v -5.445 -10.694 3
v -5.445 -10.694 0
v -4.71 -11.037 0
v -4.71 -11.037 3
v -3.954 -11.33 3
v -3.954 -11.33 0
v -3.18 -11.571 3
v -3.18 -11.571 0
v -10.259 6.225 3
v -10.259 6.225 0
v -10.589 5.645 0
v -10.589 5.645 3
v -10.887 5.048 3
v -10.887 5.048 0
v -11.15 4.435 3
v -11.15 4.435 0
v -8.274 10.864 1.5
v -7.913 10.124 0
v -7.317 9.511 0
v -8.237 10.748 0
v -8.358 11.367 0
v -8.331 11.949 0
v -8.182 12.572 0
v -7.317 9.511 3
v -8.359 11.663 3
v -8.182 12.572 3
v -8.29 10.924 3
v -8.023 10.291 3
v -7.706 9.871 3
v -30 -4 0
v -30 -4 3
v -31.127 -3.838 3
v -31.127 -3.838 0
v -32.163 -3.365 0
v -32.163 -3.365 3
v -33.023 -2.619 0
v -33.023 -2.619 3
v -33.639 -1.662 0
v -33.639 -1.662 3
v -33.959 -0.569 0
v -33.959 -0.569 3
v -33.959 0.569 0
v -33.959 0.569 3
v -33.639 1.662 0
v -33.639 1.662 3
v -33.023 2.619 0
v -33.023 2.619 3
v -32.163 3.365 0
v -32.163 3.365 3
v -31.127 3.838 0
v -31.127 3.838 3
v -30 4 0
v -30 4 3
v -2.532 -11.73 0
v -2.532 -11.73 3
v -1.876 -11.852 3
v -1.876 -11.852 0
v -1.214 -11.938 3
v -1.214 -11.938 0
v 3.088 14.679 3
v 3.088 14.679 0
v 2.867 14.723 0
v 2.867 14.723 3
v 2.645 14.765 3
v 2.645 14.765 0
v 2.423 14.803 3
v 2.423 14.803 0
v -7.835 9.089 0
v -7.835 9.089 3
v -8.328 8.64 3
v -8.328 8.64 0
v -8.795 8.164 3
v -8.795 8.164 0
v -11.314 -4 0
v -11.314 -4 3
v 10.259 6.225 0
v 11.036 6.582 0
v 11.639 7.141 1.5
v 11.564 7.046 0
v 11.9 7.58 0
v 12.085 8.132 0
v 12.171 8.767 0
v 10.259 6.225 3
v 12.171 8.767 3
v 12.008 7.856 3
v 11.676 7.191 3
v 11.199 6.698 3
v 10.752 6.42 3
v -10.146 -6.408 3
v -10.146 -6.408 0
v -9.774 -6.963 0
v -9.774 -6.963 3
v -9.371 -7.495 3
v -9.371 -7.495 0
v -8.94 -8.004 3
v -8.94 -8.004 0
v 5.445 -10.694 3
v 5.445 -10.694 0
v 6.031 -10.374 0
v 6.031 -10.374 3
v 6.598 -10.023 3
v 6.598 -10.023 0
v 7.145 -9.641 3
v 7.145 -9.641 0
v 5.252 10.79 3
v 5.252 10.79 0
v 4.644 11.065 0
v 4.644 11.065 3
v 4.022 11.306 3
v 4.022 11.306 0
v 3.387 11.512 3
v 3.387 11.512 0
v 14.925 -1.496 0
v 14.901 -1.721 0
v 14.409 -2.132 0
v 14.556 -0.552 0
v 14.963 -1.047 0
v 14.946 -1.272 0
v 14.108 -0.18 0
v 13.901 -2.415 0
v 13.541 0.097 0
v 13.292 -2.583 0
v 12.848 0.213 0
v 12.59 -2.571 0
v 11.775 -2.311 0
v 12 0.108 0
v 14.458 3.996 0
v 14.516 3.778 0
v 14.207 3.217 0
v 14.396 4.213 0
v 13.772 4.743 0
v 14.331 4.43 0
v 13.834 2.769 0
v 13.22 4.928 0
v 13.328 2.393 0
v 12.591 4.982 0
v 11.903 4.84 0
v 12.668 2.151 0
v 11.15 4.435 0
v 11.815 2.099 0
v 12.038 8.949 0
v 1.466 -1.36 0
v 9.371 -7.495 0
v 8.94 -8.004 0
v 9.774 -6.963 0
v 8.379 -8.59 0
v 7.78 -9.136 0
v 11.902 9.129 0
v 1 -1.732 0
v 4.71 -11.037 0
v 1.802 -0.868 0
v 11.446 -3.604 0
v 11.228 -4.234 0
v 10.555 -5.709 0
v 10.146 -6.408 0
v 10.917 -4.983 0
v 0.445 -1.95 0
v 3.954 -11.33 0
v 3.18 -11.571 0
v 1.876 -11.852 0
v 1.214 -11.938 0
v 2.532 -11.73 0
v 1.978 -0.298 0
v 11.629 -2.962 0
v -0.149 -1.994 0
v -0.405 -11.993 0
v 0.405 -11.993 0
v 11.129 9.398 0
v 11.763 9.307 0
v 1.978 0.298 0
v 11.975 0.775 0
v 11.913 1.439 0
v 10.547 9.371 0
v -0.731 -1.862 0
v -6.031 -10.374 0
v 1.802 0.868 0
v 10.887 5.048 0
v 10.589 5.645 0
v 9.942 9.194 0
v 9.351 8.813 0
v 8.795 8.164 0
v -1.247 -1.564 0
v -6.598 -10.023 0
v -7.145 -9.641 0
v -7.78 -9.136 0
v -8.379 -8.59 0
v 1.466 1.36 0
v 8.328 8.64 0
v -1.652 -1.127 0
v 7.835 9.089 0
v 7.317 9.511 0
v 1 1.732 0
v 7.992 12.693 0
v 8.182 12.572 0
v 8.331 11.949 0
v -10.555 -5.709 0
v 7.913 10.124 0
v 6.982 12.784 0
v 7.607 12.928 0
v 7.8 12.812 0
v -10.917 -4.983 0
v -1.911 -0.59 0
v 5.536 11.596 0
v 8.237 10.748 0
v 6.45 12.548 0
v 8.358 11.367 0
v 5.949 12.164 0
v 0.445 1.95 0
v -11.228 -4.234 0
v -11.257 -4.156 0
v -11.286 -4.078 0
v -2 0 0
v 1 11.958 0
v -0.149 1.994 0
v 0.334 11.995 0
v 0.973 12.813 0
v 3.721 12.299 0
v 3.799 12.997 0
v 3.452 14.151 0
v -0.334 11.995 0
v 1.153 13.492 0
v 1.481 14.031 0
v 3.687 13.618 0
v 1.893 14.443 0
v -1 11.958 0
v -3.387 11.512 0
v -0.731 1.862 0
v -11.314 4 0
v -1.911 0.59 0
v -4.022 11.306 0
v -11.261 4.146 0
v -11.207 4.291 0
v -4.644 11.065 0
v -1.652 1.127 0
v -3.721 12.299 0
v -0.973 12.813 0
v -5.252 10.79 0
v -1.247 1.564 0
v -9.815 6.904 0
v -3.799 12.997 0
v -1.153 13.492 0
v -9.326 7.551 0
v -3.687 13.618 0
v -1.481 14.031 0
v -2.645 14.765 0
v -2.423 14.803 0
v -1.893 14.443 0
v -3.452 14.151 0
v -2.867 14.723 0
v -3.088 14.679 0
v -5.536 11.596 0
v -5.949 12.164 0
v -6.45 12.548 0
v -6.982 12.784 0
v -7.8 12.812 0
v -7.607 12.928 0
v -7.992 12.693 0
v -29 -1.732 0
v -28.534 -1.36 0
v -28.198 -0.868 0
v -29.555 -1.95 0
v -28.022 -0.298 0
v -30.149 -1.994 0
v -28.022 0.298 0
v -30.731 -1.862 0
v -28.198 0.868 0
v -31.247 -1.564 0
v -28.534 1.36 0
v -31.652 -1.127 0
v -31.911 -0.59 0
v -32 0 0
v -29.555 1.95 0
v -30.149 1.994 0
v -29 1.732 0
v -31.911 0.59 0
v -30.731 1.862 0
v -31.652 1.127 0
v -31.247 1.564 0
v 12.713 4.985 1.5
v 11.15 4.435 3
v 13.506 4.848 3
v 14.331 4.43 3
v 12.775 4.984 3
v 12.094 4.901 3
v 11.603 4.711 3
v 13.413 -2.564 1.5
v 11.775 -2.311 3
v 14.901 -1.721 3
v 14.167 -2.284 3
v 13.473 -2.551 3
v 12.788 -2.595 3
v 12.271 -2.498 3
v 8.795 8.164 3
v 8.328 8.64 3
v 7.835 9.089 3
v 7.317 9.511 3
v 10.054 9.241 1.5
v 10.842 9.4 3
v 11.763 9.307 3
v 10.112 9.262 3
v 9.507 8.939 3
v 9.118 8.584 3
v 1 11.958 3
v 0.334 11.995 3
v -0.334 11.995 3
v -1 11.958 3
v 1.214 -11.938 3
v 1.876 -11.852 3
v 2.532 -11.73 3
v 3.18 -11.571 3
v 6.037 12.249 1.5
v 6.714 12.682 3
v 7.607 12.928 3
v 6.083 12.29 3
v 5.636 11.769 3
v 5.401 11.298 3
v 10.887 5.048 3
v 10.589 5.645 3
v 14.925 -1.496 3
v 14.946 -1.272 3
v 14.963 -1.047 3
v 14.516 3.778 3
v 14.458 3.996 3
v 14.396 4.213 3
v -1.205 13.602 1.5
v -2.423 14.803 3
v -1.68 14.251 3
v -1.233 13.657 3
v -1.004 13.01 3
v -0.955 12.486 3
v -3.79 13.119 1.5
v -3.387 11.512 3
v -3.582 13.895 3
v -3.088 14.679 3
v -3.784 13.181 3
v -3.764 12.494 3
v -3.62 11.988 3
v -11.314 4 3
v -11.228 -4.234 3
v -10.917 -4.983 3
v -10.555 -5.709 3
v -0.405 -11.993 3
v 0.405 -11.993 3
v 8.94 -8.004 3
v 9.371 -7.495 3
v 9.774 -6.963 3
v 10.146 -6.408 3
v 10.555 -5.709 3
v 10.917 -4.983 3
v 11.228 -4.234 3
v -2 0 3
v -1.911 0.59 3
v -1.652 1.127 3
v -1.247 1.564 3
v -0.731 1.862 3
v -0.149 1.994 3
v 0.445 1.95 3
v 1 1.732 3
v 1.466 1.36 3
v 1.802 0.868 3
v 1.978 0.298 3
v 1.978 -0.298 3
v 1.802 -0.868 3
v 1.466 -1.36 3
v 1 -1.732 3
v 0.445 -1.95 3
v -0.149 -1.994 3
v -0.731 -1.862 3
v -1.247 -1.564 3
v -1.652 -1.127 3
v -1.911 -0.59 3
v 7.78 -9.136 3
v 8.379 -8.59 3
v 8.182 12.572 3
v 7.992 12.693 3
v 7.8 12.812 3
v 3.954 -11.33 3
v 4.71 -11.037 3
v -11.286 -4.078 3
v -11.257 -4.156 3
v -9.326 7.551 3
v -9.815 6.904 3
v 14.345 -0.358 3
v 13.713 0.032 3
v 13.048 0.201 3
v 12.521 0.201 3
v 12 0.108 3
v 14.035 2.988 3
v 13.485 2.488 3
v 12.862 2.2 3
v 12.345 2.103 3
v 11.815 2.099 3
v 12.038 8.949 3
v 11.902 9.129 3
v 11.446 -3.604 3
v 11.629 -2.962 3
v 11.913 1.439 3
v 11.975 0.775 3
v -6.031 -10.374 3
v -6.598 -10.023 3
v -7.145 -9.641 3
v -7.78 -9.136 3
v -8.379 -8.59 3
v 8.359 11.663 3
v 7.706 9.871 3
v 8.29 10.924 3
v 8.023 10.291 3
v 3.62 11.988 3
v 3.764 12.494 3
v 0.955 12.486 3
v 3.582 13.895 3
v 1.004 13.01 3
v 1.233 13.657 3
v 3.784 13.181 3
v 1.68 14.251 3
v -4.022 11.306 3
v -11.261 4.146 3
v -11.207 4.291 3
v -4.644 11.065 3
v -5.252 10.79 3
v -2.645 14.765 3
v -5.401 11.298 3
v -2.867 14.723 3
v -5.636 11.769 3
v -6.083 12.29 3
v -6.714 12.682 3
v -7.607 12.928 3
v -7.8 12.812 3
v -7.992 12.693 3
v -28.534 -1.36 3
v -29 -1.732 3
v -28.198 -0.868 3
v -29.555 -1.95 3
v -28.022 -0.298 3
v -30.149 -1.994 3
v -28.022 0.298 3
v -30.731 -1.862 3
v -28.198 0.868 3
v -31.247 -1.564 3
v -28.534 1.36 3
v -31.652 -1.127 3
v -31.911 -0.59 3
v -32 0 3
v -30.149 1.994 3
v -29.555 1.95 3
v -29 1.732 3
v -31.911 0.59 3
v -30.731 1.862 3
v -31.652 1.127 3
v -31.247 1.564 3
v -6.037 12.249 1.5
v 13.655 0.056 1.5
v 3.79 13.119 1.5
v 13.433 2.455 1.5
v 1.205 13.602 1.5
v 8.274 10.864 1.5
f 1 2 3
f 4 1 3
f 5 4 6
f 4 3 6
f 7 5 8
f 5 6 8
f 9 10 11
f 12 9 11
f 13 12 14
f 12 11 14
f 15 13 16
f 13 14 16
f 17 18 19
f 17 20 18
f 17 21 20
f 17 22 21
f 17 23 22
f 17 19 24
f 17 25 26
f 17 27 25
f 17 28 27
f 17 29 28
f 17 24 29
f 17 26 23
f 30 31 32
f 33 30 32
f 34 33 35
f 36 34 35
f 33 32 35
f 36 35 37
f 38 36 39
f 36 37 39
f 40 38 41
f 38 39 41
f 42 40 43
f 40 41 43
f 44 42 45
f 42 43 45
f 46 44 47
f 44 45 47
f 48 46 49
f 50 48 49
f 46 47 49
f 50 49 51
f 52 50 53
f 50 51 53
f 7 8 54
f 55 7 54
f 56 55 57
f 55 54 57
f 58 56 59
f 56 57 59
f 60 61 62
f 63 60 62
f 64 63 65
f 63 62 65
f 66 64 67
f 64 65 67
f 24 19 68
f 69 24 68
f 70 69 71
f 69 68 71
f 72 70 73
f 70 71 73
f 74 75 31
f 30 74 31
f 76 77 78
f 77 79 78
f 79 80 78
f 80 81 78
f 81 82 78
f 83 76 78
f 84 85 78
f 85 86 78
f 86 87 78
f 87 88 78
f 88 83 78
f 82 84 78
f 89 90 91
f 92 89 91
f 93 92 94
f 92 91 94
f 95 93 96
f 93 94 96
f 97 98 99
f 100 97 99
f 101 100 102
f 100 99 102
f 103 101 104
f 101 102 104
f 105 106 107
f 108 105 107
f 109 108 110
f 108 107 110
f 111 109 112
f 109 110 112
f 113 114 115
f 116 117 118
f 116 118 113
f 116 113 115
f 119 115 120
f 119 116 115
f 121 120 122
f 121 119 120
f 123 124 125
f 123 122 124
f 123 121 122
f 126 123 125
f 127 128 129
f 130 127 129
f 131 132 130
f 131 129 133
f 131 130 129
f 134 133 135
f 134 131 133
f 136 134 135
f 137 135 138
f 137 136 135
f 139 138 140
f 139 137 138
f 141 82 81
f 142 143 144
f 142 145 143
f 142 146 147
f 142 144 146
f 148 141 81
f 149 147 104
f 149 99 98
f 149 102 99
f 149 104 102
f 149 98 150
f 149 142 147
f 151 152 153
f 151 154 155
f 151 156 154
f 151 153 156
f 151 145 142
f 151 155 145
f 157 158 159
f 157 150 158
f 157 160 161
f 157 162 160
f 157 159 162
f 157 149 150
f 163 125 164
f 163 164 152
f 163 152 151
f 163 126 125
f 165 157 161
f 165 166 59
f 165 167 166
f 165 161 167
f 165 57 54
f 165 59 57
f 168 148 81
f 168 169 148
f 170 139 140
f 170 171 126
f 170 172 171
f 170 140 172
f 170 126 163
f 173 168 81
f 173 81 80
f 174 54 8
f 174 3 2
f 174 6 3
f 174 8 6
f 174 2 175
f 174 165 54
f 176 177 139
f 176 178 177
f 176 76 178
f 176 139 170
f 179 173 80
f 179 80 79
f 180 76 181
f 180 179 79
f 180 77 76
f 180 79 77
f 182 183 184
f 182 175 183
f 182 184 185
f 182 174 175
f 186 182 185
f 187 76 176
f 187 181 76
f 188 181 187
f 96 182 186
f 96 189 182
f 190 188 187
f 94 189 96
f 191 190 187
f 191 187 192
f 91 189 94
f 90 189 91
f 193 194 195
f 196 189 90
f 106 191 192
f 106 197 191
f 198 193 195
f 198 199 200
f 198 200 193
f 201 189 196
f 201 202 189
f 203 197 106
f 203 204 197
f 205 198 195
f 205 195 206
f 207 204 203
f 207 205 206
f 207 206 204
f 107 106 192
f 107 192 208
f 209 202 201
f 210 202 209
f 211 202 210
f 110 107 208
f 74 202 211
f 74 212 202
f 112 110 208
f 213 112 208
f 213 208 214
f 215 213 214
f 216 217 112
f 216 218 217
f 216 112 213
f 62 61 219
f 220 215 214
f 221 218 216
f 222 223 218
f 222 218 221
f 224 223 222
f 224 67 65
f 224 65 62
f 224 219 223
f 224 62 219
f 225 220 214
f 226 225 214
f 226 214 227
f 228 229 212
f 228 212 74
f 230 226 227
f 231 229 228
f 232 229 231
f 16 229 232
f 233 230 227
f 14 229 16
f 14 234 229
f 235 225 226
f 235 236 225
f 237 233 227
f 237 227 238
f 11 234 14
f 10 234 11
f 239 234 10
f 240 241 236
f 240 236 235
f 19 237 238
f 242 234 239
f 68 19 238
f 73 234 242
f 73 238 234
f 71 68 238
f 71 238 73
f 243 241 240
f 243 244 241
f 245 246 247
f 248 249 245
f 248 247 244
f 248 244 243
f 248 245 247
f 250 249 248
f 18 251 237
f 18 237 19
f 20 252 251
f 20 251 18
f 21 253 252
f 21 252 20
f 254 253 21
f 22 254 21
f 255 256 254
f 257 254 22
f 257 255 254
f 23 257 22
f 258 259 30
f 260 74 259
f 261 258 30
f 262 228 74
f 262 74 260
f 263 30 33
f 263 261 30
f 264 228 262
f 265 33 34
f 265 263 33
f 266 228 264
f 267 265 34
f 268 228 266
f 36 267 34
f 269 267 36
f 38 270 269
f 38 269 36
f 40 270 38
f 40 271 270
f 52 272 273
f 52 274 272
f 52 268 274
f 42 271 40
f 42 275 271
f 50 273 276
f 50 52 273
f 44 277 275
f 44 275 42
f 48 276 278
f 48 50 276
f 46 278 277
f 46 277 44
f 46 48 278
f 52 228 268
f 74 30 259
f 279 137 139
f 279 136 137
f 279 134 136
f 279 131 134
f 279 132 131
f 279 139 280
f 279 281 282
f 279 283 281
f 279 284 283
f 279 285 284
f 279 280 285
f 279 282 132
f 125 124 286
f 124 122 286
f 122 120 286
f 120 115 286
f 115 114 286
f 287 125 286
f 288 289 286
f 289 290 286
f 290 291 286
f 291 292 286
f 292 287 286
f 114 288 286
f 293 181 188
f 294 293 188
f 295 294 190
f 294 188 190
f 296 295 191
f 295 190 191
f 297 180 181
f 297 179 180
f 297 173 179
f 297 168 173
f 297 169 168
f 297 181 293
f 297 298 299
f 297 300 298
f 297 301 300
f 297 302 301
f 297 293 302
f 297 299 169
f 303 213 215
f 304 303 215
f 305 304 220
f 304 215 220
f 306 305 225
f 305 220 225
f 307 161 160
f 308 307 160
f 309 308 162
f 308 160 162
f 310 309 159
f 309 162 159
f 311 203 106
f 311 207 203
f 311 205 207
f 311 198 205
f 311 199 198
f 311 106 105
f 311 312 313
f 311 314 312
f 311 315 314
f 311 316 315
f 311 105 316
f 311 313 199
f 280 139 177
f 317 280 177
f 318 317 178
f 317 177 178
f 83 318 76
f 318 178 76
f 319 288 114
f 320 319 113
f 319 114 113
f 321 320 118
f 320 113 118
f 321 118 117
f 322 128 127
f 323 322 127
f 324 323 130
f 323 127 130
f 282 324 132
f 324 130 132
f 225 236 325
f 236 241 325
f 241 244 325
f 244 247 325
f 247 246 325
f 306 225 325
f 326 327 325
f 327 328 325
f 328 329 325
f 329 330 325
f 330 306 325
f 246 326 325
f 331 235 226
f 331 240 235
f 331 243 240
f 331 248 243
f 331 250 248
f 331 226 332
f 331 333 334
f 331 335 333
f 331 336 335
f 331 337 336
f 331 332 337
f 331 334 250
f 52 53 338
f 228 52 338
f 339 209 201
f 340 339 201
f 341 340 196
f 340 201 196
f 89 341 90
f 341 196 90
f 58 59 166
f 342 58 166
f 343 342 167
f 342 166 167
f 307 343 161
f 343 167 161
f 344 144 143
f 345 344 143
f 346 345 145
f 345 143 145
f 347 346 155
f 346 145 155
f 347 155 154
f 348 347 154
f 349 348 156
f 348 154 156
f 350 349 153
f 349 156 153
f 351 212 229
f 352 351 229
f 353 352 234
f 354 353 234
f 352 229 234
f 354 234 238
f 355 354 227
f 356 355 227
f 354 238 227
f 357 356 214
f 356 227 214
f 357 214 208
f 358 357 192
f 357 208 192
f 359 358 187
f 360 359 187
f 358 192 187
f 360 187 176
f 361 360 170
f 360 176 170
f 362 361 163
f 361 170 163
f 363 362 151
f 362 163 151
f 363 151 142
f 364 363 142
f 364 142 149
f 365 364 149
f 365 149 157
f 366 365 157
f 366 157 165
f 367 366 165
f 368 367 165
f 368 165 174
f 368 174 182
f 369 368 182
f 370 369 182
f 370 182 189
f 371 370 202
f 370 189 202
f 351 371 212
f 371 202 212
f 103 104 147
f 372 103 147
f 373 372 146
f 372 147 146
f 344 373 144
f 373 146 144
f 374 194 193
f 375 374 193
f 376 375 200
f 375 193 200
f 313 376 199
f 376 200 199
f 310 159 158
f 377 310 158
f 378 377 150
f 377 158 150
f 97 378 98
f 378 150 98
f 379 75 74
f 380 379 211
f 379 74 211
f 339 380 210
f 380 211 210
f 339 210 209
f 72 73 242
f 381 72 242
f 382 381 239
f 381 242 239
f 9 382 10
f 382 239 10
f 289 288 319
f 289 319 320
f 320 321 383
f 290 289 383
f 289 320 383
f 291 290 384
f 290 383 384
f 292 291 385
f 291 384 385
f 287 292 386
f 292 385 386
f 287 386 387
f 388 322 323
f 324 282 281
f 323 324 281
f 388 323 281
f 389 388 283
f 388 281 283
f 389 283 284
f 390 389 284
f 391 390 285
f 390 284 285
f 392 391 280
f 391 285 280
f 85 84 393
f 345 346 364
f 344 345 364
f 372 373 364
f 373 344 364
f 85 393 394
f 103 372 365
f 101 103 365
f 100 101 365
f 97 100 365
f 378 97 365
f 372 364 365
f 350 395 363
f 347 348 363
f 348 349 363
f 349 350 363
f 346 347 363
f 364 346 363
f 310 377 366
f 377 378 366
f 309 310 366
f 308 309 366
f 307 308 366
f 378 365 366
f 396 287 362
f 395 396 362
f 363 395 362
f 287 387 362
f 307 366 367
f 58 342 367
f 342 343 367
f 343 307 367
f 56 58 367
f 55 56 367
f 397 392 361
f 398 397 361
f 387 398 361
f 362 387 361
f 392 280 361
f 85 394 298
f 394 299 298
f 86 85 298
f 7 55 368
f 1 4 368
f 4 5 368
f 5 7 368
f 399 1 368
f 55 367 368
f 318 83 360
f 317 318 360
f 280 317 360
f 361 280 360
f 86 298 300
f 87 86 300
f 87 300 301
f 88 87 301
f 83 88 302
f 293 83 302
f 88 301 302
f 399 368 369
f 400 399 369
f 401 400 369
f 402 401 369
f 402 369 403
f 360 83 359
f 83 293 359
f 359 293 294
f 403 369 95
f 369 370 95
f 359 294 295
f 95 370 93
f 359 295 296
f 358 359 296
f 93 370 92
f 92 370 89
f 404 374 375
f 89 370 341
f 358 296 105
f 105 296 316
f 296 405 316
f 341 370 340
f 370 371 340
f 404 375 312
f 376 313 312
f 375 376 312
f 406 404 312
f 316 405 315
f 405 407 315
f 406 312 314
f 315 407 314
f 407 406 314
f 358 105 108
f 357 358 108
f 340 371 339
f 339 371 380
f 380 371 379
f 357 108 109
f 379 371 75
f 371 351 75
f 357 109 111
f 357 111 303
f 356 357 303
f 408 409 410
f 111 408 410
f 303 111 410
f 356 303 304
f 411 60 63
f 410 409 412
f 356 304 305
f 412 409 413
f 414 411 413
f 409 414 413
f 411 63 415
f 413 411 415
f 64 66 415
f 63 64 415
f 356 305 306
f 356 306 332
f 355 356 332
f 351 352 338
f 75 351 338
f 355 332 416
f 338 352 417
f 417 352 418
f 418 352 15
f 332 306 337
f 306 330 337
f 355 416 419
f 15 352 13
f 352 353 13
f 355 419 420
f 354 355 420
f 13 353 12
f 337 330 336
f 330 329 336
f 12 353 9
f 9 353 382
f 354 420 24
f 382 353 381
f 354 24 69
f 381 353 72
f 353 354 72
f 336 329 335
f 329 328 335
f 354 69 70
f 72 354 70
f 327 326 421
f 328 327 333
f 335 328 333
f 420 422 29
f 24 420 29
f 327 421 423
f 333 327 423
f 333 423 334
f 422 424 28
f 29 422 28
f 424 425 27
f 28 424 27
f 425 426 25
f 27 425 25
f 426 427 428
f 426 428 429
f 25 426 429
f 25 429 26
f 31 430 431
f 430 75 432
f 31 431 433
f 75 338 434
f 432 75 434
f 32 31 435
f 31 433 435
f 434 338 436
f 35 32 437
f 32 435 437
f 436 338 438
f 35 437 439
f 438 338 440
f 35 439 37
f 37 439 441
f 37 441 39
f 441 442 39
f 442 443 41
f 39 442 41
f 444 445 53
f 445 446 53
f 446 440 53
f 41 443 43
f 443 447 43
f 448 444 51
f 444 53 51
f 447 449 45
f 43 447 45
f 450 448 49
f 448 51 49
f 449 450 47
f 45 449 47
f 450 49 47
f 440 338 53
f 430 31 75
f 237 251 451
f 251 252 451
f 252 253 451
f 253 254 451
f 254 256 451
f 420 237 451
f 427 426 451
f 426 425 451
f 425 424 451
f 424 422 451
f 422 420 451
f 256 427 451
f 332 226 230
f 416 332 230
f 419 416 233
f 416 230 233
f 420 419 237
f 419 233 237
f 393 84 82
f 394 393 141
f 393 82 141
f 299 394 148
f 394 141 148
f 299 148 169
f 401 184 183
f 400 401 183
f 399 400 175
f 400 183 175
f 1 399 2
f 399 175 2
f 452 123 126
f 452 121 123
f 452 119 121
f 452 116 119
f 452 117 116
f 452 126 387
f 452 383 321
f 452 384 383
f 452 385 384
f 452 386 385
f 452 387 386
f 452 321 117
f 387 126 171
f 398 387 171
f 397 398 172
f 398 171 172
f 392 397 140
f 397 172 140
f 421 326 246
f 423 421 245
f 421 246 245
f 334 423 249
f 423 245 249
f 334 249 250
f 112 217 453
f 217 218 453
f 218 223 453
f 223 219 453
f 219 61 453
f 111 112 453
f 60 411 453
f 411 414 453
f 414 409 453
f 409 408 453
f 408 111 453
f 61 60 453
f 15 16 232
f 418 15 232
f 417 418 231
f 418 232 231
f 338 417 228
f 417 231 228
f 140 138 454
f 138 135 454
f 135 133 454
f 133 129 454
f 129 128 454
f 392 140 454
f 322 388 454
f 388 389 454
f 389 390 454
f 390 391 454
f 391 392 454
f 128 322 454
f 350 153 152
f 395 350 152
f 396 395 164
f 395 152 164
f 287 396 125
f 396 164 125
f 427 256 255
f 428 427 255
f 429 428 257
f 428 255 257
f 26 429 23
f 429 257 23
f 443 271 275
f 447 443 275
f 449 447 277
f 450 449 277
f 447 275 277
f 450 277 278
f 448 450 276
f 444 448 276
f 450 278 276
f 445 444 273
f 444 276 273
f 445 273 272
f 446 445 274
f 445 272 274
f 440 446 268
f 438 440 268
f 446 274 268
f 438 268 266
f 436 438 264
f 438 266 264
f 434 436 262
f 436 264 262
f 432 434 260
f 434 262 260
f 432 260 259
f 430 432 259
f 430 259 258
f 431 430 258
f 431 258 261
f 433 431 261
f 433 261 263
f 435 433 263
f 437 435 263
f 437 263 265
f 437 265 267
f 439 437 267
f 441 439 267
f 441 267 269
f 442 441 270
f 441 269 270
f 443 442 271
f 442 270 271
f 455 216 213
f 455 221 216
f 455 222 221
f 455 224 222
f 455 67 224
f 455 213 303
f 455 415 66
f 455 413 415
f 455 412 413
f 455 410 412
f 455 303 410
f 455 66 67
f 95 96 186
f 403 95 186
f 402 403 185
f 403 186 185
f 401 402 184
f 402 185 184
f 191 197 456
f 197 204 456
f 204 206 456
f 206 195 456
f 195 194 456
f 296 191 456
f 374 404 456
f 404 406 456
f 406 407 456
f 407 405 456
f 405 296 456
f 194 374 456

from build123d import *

# Parameters (mm, degrees)
EXTRUDE_1_OUTLINE_R      = 19
EXTRUDE_1_DEPTH          = 3
CUT_EXTRUDE_1_DEPTH      = 28.037011669
CUT_EXTRUDE_START        = -3
SKETCH_5_R               = 19
SKETCH_5_R_2             = 15
CUT_EXTRUDE_2_DEPTH      = 3
PATTERN_CIRCULAR_1_COUNT = 17
CUT_EXTRUDE_4_DEPTH      = 3
EXTRUDE_3_DEPTH          = 3
SKETCH_7_R               = 2
CUT_EXTRUDE_3_DEPTH      = 3


# Read off the part's stored shape, not the designer's step: 凸台-拉伸1
with BuildPart() as part:
    # 凸台-拉伸1 outline → 凸台-拉伸1 (new body)
    with BuildSketch(Plane.XY):
        Circle(EXTRUDE_1_OUTLINE_R)
    extrude(amount=EXTRUDE_1_DEPTH)

    # 草图2 → 切除-拉伸1 (cut, through all)
    with BuildSketch(Plane.XY):
        with BuildLine():
            ThreePointArc((1, 11.958260743), (0, 12), (-1, 11.958260743))
            add(Edge.make_bspline(
                [(-1, 11.958260743), (-0.697871553, 13.823728022), (-2.422759286, 14.803048248)],
                knots=[0, 0, 0, 1, 1, 1], degree=2))
            ThreePointArc((-2.422759286, 14.803048248), (0, 15), (2.422759286, 14.803048248))
            add(Edge.make_bspline(
                [(1, 11.958260743), (0.697871553, 13.823728022), (2.422759286, 14.803048248)],
                knots=[0, 0, 0, 1, 1, 1], degree=2))
        make_face()
    cut_extrude_1 = extrude(amount=CUT_EXTRUDE_1_DEPTH, mode=Mode.SUBTRACT)

    # 草图5 → 切除-拉伸2 (cut)
    with BuildSketch(Plane.XY.offset(3).offset(CUT_EXTRUDE_START)):
        Circle(SKETCH_5_R)
        Circle(SKETCH_5_R_2, mode=Mode.SUBTRACT)
    extrude(amount=CUT_EXTRUDE_2_DEPTH, mode=Mode.SUBTRACT)

    # 阵列(圆周)1: 切除-拉伸1 ×17 about axis
    pattern_circular_1_axis = Axis((0, 0, 3), (0, 0, -1))
    for i in range(1, PATTERN_CIRCULAR_1_COUNT):
        add(cut_extrude_1.rotate(pattern_circular_1_axis, i * 360 / PATTERN_CIRCULAR_1_COUNT), mode=Mode.SUBTRACT)

    # 草图8 → 切除-拉伸4 (cut)
    with BuildSketch(Plane(origin=(0, 0, 0), x_dir=(-1, 0, 0), z_dir=(0, 0, -1))):
        with BuildLine():
            Line((10.120821448, 11.071087264), (8.096657158, 8.856869812))
            ThreePointArc((8.096657158, 8.856869812), (6.278516295, -10.226447728), (-11.561990246, -3.212535065))
            Line((-11.561990246, -3.212535065), (-13.925196787, -5.575741606))
            ThreePointArc((-13.925196787, -5.575741606), (8.538005961, -12.332982373), (10.120821448, 11.071087264))
        make_face()
    extrude(amount=-CUT_EXTRUDE_4_DEPTH, mode=Mode.SUBTRACT)

    # 草图6 → 凸台-拉伸3 (add)
    with BuildSketch(Plane.XY.offset(3)):
        with BuildLine():
            Line((-30, 4), (0, 4))
            Line((0, 4), (0, -4))
            Line((0, -4), (-30, -4))
            ThreePointArc((-30, -4), (-34, 0), (-30, 4))
        make_face()
    extrude(amount=-EXTRUDE_3_DEPTH)

    # 草图7 → 切除-拉伸3 (cut)
    with BuildSketch(Plane(origin=(0, 0, 0), x_dir=(-1, 0, 0), z_dir=(0, 0, -1))):
        Circle(SKETCH_7_R)
        with Locations((30, 0)):
            Circle(SKETCH_7_R)
    extrude(amount=-CUT_EXTRUDE_3_DEPTH, mode=Mode.SUBTRACT)


solid = part.part
